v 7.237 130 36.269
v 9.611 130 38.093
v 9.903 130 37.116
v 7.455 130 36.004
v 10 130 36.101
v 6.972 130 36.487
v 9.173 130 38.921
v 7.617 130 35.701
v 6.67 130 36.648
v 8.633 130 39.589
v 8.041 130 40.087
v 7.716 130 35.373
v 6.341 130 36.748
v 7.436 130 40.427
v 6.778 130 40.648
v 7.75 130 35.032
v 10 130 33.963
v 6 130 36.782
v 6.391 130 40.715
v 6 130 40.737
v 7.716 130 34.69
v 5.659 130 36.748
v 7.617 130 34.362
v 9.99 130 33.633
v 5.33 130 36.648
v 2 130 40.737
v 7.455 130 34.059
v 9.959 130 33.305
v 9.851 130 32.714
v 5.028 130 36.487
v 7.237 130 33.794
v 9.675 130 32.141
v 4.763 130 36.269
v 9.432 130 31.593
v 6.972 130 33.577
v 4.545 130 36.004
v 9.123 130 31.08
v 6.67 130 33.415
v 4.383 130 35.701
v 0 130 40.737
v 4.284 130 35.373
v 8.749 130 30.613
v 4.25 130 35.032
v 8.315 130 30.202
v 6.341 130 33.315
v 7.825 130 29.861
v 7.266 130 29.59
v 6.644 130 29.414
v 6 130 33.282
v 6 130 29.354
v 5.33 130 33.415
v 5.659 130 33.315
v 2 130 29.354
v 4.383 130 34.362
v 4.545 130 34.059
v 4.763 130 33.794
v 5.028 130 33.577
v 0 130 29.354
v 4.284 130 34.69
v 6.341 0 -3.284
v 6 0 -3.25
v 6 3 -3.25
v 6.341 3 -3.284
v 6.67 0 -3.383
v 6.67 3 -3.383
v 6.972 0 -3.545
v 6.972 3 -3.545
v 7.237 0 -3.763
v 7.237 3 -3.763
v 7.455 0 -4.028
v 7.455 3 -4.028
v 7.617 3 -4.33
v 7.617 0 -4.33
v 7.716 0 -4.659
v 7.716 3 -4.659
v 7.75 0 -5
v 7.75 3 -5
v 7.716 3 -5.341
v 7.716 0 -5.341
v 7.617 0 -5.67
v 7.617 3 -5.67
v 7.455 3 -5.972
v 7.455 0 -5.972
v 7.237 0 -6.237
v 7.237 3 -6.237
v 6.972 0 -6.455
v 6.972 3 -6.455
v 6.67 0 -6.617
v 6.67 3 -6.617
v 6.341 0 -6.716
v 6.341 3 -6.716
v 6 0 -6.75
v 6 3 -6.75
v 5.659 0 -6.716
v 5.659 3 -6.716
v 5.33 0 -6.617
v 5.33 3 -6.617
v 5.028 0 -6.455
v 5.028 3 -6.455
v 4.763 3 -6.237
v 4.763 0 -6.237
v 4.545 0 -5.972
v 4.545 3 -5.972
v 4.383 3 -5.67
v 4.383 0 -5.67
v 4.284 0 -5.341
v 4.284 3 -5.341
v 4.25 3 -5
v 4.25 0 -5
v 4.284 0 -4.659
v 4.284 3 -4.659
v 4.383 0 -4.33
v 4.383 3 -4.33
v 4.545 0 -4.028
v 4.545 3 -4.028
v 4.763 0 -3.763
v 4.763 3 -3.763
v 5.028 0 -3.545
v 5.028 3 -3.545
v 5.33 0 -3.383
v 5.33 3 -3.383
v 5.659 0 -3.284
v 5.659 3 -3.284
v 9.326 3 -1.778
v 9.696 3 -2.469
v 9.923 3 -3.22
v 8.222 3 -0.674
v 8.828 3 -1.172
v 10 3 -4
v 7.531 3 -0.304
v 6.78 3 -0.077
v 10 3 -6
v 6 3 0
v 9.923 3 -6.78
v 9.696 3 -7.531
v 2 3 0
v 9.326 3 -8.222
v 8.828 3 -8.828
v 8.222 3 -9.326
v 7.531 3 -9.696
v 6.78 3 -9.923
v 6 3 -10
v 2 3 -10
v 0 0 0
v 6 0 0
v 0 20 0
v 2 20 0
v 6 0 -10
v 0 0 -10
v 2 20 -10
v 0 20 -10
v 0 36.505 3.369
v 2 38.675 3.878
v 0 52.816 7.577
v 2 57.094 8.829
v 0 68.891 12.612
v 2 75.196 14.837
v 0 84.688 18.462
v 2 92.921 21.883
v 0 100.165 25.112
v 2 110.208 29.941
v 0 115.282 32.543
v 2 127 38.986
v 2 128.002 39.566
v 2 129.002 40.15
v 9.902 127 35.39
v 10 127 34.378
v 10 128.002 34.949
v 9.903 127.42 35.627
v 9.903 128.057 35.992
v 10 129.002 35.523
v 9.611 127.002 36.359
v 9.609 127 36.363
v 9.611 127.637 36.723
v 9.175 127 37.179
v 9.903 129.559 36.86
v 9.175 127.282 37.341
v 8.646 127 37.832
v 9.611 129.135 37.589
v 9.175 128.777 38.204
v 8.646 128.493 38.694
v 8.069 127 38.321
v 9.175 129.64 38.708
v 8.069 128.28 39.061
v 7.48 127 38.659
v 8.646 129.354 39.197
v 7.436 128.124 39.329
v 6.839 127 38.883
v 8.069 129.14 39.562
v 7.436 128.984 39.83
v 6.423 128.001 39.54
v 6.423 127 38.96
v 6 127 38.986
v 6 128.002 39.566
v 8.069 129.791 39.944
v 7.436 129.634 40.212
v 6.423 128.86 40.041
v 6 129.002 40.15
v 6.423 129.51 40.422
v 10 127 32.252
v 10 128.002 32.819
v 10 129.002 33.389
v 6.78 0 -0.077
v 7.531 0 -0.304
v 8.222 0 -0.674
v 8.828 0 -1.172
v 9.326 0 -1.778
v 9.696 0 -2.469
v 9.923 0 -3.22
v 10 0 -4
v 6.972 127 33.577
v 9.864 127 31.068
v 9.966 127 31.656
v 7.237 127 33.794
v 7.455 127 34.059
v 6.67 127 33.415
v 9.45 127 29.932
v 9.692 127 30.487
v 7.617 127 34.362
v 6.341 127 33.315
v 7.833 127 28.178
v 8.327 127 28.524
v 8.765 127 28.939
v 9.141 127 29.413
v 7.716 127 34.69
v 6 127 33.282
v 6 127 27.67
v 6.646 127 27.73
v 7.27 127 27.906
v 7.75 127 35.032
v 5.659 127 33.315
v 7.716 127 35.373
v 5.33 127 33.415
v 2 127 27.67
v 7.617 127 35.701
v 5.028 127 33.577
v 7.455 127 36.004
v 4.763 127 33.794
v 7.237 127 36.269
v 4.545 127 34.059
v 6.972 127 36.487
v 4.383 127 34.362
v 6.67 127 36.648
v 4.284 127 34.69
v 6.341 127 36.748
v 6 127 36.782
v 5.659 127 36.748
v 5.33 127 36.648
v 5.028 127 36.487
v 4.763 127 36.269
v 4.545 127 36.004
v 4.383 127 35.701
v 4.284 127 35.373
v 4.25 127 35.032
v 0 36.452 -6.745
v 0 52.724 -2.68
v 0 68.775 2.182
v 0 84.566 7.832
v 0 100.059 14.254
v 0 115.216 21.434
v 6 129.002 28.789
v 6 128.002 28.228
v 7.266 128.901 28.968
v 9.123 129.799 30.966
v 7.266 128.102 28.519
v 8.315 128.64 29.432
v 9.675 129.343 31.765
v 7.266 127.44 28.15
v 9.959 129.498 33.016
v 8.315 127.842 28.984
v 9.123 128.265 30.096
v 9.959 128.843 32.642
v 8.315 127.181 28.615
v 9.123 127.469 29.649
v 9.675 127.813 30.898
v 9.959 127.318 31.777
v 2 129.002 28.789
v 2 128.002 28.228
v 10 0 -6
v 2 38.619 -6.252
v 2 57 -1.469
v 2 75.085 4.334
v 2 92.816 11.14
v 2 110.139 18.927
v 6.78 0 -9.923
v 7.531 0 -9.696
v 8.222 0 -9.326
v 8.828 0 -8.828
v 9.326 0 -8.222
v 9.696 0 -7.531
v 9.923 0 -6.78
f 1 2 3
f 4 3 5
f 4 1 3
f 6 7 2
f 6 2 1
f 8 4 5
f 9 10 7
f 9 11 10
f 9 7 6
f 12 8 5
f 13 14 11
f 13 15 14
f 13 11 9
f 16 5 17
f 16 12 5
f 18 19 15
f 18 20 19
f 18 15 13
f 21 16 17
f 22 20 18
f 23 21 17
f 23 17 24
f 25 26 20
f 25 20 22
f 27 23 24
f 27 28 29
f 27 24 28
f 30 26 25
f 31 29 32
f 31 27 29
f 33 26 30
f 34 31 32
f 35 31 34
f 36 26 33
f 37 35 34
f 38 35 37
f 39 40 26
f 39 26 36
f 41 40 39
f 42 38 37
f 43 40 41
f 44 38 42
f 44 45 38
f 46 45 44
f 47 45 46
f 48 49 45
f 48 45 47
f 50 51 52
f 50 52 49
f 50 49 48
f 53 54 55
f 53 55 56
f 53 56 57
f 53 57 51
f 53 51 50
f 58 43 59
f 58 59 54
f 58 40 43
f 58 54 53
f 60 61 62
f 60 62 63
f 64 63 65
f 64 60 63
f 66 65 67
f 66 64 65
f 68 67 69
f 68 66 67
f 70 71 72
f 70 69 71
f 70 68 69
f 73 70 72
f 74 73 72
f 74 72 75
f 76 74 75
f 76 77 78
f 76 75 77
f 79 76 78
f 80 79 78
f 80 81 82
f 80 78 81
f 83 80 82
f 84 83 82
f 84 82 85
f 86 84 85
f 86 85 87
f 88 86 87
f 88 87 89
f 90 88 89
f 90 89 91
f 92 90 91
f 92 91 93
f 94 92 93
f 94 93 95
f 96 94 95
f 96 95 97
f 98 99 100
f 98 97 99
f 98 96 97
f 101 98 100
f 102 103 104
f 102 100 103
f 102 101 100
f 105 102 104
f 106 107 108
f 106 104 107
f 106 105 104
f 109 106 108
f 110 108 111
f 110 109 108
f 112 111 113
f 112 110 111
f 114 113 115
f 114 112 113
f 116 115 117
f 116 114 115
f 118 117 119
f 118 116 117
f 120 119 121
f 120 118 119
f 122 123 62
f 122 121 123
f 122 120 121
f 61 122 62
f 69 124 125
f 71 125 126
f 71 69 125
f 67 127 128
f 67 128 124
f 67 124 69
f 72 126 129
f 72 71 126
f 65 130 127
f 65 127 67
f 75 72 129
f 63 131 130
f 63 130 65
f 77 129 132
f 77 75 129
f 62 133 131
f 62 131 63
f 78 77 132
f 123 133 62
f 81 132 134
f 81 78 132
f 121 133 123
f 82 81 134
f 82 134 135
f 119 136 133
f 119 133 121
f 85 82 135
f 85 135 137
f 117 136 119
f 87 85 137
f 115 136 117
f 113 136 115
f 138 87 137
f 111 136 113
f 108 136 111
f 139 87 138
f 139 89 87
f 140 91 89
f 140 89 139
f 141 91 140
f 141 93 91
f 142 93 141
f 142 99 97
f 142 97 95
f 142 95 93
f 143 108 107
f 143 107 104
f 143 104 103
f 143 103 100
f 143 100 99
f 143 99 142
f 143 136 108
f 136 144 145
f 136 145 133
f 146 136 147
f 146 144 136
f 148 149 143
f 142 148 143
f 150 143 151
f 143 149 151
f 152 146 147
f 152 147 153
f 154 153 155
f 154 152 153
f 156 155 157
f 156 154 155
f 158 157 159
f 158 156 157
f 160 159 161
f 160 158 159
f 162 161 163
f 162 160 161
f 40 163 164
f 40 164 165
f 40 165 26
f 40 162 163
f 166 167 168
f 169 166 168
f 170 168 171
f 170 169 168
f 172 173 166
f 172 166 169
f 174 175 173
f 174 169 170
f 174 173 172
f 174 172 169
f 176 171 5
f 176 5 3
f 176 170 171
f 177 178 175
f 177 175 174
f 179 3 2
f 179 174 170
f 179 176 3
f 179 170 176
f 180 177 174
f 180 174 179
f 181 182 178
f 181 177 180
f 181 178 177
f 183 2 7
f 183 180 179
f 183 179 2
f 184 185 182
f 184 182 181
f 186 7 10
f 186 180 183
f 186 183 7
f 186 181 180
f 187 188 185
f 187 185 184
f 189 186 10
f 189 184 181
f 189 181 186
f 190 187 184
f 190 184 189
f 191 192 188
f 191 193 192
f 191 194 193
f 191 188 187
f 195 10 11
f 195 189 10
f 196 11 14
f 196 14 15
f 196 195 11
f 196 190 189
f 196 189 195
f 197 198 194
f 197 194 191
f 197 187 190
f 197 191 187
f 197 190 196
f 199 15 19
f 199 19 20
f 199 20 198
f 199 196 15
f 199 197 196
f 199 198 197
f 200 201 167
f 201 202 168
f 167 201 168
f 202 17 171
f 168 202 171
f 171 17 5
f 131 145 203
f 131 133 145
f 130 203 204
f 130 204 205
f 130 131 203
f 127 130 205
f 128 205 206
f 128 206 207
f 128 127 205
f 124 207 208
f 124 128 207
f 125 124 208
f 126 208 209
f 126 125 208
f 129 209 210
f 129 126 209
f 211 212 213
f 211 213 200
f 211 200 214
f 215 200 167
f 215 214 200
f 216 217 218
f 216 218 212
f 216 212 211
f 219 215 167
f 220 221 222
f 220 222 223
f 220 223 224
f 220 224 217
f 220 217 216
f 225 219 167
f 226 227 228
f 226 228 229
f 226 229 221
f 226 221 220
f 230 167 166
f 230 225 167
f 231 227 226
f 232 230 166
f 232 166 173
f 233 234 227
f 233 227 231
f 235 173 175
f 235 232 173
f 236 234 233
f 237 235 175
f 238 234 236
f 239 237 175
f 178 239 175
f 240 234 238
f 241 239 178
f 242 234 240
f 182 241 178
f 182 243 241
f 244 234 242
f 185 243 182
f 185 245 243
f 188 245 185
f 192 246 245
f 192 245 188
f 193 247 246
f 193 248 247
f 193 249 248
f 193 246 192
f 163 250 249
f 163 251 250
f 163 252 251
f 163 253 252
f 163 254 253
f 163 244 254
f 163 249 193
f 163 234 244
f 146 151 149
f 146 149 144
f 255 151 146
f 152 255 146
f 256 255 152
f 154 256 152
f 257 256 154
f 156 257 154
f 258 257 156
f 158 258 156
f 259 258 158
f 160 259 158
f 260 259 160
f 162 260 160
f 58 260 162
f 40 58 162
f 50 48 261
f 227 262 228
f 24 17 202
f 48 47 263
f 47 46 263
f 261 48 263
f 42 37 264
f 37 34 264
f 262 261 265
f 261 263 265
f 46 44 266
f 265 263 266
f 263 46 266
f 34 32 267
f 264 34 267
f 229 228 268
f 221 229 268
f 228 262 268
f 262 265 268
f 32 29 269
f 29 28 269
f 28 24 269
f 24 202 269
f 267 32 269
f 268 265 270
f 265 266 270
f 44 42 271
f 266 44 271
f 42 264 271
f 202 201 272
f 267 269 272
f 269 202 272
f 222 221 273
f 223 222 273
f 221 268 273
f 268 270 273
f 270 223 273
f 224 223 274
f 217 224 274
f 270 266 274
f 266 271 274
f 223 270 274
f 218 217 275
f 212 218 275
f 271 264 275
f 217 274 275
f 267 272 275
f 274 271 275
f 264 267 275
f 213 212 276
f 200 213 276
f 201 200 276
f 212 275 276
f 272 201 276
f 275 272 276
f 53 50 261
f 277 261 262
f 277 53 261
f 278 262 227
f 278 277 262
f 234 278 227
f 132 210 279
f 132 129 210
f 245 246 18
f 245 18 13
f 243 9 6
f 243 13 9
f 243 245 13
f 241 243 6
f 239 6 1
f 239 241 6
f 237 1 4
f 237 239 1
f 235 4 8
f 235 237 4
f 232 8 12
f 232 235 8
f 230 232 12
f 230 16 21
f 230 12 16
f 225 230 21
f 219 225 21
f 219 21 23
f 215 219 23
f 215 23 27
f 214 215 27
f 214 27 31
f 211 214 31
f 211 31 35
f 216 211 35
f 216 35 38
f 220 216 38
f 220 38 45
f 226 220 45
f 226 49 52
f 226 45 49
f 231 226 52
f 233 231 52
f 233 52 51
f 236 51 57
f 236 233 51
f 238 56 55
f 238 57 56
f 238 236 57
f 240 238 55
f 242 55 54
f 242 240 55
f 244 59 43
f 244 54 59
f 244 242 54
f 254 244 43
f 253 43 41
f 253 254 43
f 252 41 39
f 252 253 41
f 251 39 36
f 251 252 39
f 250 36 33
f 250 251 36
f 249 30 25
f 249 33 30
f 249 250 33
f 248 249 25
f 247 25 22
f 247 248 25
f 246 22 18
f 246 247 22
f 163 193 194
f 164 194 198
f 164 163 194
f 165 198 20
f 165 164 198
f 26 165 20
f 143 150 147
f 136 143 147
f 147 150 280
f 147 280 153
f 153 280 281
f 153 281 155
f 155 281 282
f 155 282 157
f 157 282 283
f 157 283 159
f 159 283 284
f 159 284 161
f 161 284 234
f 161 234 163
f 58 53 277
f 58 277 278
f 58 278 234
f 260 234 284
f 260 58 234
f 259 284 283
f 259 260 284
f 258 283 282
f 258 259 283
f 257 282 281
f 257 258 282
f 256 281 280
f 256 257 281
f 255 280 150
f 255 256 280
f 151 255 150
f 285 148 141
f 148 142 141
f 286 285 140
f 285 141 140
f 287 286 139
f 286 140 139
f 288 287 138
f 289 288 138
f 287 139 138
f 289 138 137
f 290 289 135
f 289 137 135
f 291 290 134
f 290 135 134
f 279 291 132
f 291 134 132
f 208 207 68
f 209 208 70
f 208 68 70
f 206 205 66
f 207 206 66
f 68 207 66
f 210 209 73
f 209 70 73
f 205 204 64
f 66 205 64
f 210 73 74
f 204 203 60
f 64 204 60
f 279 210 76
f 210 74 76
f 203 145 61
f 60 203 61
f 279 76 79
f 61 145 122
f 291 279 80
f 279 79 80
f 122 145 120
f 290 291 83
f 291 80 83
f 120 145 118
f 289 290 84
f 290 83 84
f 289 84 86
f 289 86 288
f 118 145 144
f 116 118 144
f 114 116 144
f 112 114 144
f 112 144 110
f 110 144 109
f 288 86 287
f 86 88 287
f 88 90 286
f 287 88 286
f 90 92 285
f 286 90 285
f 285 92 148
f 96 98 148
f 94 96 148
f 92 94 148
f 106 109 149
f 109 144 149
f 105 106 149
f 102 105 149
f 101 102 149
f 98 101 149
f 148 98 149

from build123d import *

# Parameters (mm, degrees)
BOSS_EXTRUDE1_DEPTH     = 2
SKETCH2_W               = 10
SKETCH2_H               = 3
BOSS_EXTRUDE2_DEPTH     = 8
FILLET1_R               = 4
CUT_EXTRUDE1_DEPTH      = 134.747858576
CUT_EXTRUDE1_DEPTH_BACK = 134.747858576
SKETCH3_R               = 1.75


with BuildPart() as part:
    # Sketch1 → Boss-Extrude1 (new body)
    with BuildSketch(Plane(origin=(0, 0, 0), x_dir=(0, 0, -1), z_dir=(1, 0, 0))):
        with BuildLine():
            Line((-40.736833925, 130), (-29.353634228, 130))
            ThreePointArc((-29.353634228, 130), (-4.909489029, 76.705560779), (10, 20))
            Line((10, 20), (10, 0))
            Line((10, 0), (0, 0))
            Line((0, 0), (0, 20))
            ThreePointArc((0, 20), (-15.436156632, 76.826587909), (-40.736833925, 130))
        make_face()
    extrude(amount=BOSS_EXTRUDE1_DEPTH)

    # Sketch2 → Boss-Extrude2 (add)
    with BuildSketch(Plane(origin=(2, 0, 0), x_dir=(0, 0, -1), z_dir=(1, 0, 0))):
        with Locations((5, 1.5)):
            Rectangle(SKETCH2_W, SKETCH2_H)
        with BuildLine():
            Line((-40.736833925, 130), (-29.353634228, 130))
            ThreePointArc((-29.353634228, 130), (-28.507977965, 128.502132743), (-27.669921848, 127))
            Line((-27.669921848, 127), (-38.985998837, 127))
            ThreePointArc((-38.985998837, 127), (-39.857464817, 128.502306179), (-40.736833925, 130))
        make_face()
    extrude(amount=BOSS_EXTRUDE2_DEPTH)

    # Fillet1
    fillet1_edges = [part.edges().sort_by_distance(p)[0] for p in [
        (10, 1.5, 0),
        (10, 1.5, -10),
        (10, 128.502306179, 39.857464817),
        (10, 128.502132743, 28.507977965),
    ]]
    fillet(fillet1_edges, radius=FILLET1_R)

    # Sketch3 → Cut-Extrude1 (cut, two sides: drawn at the far end of the back side and taken through both)
    with BuildSketch(Plane(origin=(0, 3, 0), x_dir=(1, 0, 0), z_dir=(0, 1, 0)).offset(-CUT_EXTRUDE1_DEPTH_BACK)):
        with Locations(Location((6, 5, 0), (0, 0, 270))):
            Circle(SKETCH3_R)
        with Locations(Location((6, -35.031677414, 0), (0, 0, 270))):
            Circle(SKETCH3_R)
    extrude(amount=CUT_EXTRUDE1_DEPTH + CUT_EXTRUDE1_DEPTH_BACK, mode=Mode.SUBTRACT)


solid = part.part
